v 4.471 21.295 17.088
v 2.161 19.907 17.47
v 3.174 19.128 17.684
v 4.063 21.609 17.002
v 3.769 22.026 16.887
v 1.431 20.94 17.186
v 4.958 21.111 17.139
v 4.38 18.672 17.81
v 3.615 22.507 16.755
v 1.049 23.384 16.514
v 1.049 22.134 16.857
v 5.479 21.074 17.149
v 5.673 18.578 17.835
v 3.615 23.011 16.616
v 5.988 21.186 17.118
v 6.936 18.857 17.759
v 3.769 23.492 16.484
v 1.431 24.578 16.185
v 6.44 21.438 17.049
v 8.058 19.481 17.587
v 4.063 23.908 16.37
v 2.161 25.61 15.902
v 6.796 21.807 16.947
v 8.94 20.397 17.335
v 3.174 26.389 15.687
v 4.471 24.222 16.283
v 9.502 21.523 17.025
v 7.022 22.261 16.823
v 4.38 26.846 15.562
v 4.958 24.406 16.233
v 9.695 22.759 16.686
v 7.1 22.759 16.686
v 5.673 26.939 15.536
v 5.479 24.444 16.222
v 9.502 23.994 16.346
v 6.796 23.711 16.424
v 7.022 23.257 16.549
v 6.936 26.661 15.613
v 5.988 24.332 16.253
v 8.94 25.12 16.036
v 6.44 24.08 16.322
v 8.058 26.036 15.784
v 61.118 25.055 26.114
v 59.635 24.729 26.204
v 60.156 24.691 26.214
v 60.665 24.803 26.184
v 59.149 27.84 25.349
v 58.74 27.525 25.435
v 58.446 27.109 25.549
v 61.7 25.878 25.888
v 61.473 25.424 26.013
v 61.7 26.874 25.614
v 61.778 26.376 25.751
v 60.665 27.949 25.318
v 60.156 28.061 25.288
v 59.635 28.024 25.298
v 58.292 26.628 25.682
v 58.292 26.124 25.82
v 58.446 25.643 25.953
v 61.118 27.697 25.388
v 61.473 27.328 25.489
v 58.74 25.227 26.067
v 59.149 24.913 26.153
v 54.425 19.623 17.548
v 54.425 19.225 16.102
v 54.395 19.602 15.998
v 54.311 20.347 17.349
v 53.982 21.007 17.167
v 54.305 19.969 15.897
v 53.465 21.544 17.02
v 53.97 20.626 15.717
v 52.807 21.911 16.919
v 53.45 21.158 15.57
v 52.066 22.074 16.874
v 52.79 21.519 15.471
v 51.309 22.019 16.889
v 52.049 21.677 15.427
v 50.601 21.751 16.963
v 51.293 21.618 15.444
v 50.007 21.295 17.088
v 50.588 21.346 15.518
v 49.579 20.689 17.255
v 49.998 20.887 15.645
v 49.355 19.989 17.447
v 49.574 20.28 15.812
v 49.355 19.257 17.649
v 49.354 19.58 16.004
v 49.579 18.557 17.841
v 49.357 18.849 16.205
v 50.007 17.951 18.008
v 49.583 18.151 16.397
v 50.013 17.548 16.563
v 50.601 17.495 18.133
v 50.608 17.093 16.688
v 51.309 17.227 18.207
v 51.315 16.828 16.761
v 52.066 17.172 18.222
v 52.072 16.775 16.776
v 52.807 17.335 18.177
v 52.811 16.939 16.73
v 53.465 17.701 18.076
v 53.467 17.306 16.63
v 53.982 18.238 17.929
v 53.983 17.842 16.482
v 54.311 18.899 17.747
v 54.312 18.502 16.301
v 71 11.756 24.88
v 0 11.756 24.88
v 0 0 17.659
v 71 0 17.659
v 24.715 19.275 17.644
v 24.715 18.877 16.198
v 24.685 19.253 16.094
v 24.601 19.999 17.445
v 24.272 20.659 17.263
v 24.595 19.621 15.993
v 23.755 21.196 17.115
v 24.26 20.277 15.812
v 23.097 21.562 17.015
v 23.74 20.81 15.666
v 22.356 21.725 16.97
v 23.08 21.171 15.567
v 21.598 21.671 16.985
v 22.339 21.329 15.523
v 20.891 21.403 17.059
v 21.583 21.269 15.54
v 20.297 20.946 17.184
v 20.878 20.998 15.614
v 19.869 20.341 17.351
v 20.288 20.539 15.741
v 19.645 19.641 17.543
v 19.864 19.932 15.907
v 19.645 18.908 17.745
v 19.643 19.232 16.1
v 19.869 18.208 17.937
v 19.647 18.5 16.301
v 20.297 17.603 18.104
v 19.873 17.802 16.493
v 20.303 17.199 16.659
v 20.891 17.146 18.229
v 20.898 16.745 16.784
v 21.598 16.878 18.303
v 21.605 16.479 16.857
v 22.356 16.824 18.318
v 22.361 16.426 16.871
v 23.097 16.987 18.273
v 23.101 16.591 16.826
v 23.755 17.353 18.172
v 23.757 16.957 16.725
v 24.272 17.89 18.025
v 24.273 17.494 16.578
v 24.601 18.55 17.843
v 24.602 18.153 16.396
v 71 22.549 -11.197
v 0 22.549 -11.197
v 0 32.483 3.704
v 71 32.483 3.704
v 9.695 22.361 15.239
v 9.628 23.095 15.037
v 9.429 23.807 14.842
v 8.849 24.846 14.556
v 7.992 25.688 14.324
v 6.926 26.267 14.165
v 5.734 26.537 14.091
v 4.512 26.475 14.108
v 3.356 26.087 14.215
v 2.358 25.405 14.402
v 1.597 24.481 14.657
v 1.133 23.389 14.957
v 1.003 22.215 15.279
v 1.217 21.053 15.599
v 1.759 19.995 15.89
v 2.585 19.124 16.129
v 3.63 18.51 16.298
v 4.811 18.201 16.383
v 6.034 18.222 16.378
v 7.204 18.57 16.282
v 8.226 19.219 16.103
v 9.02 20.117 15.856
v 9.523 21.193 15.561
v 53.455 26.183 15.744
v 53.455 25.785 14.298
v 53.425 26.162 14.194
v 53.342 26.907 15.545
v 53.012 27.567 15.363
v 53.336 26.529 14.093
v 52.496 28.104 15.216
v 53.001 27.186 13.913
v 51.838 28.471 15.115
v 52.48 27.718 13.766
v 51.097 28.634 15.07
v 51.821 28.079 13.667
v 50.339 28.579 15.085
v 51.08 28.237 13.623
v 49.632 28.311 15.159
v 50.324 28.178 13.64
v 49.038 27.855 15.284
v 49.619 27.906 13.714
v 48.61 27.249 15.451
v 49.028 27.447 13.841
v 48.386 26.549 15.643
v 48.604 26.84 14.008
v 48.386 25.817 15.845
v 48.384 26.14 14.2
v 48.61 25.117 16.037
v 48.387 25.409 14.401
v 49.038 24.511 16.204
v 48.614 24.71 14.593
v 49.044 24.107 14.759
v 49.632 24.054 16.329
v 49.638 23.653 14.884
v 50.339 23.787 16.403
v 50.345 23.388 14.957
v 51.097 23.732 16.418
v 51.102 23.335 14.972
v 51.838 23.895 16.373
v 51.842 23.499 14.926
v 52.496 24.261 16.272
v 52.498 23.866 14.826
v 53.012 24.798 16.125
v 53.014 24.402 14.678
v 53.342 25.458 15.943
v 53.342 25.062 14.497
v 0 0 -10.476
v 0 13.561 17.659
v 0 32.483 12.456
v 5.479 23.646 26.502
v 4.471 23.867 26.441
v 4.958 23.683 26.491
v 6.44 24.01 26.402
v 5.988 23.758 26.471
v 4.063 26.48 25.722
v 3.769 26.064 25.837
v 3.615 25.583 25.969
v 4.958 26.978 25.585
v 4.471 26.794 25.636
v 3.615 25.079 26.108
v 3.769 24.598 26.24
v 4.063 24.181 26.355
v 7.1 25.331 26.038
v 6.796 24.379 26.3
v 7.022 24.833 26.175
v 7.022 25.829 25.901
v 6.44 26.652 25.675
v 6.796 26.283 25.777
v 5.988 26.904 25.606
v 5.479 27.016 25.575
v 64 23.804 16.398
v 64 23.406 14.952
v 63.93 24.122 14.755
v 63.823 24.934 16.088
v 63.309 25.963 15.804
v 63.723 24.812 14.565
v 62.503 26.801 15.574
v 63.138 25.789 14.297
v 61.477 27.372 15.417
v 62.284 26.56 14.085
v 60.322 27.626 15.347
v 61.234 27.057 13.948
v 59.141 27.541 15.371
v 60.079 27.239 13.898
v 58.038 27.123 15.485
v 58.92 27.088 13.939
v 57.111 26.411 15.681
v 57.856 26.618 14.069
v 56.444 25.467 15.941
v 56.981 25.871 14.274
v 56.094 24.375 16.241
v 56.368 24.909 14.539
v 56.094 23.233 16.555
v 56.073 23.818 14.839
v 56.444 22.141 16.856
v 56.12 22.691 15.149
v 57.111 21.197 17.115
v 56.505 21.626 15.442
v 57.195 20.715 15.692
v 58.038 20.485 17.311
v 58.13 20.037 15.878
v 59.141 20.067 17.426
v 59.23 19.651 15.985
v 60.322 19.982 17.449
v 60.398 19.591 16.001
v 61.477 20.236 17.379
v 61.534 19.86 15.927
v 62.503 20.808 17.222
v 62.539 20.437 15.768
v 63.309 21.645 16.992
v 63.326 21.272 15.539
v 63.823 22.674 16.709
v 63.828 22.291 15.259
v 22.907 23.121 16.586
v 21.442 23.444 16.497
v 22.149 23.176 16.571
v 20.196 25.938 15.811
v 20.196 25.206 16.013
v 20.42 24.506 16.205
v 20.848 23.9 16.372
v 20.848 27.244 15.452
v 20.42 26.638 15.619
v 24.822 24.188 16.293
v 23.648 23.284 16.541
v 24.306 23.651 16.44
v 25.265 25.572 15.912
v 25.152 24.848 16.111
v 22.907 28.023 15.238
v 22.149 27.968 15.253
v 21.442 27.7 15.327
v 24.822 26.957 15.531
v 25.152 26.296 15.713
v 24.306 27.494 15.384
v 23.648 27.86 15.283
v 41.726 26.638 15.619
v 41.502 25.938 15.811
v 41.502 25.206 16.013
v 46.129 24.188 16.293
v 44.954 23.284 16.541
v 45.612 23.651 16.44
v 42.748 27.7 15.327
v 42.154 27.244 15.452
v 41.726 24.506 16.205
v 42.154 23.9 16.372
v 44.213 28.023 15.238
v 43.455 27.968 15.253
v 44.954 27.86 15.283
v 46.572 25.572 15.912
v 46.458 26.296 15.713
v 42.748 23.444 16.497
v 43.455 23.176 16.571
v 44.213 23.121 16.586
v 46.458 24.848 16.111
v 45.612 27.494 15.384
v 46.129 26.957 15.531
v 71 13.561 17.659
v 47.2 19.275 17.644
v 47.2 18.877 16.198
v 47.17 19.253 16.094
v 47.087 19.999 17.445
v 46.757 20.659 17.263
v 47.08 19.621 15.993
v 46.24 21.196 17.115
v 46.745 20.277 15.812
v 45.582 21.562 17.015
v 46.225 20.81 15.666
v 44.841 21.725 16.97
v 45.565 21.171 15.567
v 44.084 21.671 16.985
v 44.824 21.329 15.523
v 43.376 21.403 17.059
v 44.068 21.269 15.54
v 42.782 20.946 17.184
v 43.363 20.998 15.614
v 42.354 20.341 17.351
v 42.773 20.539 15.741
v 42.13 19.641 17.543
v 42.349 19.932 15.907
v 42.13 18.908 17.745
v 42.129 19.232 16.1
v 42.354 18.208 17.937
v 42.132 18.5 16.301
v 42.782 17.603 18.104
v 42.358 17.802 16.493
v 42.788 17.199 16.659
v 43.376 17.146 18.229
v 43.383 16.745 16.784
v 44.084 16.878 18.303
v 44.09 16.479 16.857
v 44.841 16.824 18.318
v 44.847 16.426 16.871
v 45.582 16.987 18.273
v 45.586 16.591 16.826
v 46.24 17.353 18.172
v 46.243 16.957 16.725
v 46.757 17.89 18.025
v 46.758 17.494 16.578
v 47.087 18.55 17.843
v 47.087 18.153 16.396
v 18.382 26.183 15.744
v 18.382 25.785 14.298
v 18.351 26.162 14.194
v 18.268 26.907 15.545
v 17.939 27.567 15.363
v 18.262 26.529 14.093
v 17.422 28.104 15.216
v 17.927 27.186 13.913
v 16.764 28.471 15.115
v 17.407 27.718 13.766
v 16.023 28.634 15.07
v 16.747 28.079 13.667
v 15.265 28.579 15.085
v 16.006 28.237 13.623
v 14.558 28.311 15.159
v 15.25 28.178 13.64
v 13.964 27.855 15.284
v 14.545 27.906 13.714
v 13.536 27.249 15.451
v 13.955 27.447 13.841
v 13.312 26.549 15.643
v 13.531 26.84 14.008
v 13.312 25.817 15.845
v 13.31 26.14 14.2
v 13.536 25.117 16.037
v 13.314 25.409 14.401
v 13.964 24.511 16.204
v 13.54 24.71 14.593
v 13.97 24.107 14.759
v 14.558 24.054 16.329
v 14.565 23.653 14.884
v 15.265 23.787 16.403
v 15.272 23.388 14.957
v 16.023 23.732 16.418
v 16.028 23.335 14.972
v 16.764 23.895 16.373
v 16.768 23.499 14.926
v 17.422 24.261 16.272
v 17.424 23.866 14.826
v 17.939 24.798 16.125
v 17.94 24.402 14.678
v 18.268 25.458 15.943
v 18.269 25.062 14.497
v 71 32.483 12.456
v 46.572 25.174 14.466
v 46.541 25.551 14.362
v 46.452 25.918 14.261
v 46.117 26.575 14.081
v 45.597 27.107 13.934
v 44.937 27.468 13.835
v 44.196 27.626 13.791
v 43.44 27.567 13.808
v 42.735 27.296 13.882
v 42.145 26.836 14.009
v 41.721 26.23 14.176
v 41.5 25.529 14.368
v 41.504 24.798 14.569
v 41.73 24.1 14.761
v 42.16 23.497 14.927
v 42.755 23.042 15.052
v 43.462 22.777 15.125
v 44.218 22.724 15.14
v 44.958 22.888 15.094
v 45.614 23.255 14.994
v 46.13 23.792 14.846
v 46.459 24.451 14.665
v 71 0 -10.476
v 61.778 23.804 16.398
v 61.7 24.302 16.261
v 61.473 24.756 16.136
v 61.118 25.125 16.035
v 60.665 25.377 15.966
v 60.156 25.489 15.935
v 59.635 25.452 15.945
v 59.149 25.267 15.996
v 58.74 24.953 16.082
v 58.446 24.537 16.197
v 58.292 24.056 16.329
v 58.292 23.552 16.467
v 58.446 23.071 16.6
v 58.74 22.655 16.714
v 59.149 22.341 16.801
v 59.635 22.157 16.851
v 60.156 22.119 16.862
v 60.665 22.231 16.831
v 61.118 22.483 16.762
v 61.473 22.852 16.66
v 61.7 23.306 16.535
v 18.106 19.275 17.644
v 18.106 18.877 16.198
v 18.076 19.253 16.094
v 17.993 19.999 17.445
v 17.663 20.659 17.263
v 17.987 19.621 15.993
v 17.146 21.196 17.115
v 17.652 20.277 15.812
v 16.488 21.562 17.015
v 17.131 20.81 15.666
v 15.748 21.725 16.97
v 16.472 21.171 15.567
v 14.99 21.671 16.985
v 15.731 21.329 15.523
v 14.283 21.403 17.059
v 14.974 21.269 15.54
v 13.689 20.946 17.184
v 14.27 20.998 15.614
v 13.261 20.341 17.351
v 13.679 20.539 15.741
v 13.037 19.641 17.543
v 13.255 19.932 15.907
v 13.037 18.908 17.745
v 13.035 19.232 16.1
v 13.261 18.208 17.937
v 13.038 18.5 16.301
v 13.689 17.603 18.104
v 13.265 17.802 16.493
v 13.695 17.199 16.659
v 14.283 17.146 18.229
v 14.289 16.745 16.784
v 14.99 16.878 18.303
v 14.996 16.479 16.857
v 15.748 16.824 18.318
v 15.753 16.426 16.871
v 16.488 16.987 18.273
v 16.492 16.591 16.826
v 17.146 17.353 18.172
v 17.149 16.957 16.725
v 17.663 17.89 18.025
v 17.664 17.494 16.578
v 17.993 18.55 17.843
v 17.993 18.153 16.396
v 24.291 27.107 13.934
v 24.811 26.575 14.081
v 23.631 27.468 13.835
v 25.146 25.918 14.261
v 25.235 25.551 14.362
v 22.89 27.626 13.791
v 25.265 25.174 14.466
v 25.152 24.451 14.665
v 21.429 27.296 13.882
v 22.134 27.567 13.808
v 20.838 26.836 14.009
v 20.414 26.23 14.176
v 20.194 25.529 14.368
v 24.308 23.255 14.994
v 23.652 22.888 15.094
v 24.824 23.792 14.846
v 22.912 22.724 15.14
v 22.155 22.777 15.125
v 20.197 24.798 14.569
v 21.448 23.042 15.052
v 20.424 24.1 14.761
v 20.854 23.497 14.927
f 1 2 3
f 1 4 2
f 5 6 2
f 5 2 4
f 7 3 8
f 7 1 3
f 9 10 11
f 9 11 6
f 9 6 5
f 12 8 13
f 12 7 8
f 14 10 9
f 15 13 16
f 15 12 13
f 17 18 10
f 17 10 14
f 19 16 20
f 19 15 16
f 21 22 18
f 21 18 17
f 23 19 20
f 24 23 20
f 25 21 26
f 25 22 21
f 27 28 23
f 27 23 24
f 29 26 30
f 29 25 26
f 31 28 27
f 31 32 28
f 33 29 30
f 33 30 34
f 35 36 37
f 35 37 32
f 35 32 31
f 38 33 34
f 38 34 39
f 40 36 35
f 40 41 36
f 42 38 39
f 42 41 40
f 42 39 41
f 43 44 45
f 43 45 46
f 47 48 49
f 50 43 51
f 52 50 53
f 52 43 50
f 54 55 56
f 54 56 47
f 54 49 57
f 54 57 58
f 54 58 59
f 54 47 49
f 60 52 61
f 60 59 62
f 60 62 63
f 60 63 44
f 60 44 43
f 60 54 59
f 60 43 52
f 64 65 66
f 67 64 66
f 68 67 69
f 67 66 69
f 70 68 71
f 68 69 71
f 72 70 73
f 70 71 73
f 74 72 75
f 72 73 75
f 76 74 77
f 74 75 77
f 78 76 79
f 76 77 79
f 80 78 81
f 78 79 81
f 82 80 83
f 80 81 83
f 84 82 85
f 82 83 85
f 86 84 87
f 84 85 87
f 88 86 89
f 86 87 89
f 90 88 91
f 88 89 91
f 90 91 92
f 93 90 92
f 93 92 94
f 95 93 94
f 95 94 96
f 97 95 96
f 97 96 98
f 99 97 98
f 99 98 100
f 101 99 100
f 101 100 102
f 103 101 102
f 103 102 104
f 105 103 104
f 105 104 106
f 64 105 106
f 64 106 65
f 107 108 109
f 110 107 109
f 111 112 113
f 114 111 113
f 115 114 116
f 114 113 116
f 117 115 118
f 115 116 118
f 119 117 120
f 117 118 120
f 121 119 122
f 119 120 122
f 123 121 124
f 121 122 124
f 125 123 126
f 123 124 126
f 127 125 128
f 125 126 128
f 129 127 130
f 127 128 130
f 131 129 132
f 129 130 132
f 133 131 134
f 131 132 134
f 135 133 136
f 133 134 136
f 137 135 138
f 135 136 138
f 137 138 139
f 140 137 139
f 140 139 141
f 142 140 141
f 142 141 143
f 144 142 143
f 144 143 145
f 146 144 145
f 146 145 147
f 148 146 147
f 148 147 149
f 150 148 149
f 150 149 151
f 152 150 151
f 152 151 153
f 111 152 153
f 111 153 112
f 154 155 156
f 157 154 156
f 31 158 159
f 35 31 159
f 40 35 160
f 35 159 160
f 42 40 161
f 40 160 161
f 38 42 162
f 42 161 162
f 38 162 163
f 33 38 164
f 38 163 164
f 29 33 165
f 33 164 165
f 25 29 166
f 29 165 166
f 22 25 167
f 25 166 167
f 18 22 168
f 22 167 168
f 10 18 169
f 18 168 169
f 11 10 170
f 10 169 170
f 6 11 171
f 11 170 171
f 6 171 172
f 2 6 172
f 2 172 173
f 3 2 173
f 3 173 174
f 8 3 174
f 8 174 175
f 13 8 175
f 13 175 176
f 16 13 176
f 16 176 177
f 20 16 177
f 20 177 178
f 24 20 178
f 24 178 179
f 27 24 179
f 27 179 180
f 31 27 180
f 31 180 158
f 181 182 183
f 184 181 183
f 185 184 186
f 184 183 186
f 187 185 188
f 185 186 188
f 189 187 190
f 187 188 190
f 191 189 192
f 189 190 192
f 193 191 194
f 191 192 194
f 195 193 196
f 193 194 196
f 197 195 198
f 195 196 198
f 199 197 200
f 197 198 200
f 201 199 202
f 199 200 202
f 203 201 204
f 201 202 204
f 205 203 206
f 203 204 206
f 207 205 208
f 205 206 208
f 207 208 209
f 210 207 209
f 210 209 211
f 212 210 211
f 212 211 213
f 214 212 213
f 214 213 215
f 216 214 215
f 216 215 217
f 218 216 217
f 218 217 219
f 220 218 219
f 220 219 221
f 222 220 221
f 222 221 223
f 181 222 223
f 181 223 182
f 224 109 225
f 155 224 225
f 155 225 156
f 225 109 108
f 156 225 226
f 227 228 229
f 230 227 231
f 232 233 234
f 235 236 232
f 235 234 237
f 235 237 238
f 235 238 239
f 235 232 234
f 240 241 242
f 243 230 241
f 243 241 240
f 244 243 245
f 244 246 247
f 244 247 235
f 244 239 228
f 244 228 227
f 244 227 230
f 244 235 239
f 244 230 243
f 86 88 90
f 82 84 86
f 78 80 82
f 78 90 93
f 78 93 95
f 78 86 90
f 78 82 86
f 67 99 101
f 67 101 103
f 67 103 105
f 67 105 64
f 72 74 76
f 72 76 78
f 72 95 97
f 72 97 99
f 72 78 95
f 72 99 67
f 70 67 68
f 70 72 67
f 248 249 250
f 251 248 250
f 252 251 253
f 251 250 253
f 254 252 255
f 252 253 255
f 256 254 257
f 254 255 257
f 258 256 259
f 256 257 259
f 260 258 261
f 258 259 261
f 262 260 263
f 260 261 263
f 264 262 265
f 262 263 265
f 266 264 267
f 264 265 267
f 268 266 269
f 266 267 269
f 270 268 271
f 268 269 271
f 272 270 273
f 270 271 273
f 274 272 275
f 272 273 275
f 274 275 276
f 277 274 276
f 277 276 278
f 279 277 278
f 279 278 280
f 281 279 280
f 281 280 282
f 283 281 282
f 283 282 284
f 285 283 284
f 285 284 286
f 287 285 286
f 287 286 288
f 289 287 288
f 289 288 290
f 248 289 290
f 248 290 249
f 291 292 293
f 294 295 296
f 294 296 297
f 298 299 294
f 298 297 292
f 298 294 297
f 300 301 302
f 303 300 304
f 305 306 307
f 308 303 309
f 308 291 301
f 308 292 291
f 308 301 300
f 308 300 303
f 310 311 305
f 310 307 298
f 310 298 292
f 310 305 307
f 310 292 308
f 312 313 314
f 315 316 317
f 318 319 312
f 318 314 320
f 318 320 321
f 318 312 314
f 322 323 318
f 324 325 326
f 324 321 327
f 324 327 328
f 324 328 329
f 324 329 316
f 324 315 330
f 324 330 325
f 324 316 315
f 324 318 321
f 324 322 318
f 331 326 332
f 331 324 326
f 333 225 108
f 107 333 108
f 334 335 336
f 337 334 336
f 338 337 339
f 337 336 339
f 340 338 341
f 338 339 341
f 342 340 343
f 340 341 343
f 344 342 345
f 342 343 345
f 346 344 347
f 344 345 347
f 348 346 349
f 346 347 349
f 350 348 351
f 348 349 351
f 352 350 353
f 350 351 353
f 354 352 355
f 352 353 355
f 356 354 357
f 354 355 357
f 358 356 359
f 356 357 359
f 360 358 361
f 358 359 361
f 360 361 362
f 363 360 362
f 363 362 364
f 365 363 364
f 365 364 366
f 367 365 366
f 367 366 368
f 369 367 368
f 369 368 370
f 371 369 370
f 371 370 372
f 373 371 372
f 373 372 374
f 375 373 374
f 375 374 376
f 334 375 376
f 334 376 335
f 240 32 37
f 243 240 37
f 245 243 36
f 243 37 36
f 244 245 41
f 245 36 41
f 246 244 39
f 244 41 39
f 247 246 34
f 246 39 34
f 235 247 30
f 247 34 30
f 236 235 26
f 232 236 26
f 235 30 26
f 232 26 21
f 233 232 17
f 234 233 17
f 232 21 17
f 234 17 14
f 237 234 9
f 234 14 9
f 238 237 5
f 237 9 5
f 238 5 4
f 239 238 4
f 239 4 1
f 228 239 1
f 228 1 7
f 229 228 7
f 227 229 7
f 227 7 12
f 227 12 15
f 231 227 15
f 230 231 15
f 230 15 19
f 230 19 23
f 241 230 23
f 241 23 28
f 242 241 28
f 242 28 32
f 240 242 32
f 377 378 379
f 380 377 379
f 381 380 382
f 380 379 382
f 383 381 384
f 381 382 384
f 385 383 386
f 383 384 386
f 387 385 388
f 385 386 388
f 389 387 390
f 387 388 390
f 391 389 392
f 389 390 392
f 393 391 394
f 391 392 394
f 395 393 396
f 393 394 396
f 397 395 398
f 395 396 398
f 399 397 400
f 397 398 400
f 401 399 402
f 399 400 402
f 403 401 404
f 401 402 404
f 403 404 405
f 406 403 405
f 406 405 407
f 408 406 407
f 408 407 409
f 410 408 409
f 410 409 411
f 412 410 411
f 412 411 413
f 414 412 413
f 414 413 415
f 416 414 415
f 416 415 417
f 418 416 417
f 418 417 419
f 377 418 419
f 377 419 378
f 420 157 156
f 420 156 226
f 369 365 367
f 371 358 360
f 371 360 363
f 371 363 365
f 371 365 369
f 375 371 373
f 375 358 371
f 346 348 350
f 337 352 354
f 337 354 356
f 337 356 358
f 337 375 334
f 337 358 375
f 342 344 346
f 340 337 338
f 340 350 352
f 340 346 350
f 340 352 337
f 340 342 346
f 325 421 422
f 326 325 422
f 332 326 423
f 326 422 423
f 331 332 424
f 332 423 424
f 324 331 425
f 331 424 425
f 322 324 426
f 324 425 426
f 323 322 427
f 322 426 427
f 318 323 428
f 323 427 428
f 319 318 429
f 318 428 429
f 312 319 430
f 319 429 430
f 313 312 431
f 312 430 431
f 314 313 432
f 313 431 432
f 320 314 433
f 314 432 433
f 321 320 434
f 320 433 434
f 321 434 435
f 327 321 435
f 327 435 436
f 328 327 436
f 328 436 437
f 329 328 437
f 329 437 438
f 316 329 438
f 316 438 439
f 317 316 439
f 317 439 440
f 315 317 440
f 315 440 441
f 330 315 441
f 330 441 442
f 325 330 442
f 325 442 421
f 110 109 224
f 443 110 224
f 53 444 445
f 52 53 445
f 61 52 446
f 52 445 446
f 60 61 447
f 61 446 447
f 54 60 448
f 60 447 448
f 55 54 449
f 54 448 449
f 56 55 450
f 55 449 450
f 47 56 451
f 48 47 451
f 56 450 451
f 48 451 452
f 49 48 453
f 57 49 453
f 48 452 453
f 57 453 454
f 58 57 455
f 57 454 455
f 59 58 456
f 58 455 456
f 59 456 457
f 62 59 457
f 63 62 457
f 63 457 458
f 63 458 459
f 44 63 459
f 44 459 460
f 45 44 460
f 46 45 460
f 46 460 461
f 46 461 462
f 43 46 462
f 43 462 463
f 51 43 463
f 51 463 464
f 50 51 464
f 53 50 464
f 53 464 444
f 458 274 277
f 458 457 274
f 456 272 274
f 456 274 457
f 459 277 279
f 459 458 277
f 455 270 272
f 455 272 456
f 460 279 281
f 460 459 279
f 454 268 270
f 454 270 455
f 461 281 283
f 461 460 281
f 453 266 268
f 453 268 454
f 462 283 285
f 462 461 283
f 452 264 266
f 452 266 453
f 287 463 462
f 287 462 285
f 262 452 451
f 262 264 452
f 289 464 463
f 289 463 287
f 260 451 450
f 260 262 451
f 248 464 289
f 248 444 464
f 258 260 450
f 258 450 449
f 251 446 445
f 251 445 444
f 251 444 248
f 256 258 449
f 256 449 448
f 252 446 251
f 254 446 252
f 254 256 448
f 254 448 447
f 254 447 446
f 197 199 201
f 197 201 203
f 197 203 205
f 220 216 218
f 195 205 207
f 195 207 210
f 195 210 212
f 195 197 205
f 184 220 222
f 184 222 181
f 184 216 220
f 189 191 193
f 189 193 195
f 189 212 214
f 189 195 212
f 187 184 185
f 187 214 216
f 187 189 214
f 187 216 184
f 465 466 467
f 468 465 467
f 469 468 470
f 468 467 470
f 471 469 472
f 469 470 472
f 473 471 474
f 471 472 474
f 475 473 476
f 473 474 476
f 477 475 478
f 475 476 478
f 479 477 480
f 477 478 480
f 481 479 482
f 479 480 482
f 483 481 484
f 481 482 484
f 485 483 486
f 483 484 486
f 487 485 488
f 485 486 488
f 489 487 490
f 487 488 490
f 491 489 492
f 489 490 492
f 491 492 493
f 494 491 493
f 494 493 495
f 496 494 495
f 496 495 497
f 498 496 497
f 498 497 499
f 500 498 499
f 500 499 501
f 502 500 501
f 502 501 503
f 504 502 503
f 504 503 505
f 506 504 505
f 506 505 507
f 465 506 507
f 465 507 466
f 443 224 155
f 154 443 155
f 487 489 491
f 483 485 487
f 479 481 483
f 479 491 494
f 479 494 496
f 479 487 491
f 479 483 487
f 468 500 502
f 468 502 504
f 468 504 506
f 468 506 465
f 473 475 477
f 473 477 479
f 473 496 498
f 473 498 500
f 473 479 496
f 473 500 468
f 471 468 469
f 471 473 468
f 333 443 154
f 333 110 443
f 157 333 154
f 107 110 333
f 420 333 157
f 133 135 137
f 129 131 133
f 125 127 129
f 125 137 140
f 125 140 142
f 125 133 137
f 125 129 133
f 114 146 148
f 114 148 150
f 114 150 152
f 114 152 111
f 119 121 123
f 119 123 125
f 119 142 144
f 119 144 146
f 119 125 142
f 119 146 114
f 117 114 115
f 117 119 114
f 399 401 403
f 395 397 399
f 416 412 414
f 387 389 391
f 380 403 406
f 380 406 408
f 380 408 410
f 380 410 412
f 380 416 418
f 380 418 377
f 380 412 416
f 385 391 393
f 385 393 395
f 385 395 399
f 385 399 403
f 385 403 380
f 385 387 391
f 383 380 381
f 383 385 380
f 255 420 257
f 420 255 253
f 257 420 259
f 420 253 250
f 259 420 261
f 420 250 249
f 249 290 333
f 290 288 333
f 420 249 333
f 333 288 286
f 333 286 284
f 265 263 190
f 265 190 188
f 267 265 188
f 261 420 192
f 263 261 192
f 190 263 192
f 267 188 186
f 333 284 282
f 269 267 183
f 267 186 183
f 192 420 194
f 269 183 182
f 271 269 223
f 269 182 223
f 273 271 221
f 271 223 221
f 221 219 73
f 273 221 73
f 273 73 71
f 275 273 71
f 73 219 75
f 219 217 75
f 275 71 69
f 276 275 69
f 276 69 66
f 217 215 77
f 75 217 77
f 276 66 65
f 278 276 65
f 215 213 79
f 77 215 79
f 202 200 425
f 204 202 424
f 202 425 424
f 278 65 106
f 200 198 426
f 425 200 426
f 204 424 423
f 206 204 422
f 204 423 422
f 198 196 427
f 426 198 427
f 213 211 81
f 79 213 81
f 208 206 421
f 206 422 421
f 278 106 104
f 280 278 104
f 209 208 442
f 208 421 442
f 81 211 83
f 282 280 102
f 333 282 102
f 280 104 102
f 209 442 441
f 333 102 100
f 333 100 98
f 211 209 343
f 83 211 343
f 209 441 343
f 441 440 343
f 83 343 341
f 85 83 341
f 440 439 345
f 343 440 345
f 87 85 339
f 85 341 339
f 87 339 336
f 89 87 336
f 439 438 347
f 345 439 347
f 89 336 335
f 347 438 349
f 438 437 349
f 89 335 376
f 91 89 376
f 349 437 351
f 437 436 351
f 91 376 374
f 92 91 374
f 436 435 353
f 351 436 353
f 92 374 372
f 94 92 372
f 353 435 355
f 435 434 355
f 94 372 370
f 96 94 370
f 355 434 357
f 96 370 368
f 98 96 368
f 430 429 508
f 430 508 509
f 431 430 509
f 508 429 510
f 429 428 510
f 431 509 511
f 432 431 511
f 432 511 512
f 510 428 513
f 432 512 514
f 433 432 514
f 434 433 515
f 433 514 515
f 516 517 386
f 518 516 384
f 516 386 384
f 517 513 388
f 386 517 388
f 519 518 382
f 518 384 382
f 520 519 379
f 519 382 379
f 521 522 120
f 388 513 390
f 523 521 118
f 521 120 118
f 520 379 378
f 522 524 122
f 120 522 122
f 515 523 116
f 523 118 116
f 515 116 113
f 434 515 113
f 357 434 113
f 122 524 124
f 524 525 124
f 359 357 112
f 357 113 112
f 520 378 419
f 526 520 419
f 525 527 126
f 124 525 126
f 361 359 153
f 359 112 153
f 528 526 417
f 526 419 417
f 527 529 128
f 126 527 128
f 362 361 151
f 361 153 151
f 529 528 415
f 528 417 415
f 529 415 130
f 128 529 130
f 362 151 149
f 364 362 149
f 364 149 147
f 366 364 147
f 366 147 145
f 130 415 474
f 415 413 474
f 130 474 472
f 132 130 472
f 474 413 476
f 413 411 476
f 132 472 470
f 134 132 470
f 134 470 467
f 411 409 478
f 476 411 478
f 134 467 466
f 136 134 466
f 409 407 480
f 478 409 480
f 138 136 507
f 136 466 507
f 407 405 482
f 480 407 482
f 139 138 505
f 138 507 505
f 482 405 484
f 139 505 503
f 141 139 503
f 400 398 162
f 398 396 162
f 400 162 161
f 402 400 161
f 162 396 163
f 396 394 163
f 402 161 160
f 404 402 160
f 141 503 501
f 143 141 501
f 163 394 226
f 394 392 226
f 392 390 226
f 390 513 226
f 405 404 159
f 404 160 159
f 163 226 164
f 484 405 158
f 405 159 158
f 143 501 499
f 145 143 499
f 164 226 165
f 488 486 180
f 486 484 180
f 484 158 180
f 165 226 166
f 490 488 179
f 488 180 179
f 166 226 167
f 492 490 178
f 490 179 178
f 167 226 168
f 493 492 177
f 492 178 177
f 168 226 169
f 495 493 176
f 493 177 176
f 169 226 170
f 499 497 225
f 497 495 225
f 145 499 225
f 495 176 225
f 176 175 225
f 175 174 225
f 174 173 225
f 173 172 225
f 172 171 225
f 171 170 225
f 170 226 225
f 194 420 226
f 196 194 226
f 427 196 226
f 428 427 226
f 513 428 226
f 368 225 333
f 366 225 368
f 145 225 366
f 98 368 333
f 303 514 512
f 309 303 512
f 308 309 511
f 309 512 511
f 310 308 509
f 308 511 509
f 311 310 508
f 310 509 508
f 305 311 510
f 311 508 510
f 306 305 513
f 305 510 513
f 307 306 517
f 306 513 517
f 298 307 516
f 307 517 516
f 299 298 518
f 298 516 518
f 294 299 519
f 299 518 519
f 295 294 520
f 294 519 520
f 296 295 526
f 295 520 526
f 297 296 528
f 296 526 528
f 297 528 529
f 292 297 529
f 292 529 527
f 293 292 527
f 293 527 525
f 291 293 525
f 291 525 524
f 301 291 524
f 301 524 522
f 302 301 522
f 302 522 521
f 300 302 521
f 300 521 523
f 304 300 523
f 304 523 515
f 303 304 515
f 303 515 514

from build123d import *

# Parameters (mm, degrees)
F1_DEPTH = 65
F2_R     = 2
F3_R     = 2.548945
F3_R_2   = 2.548946
F3_R_3   = 2.548929
F3_R_4   = 4.347674
F3_R_5   = 3.974959
F4_DEPTH = 1.5
F5_R     = 1.75256
F5_R_2   = 1.752559
F6_DEPTH = 11.2
F7_DEPTH = 71


with BuildPart() as f1:
    # F0 (on Right) → F1 (new body)
    with BuildSketch(Plane.YZ):
        Polygon((0, -10.475962), (22.549306, -11.196655), (32.483309, 3.704351), (32.483309, 12.455739), (13.561399, 17.659265), (11.756126, 24.880352), (0, 17.659265), align=None)
    extrude(amount=F1_DEPTH)

    # F2
    f2_edges = [f1.edges().sort_by_distance(p)[0] for p in [
        (32.5, 32.483309, 3.704351),
        (32.5, 32.483309, 12.455739),
    ]]
    fillet(f2_edges, radius=F2_R)

    # F3 (on face) → F4 (join)
    with BuildSketch(Plane(origin=(0, 5.468337, 19.884858), x_dir=(1, 0, 0), z_dir=(0, 0.265157, 0.964205))):
        with Locations((50.906317, 21.071024)):
            Circle(F3_R)
        with Locations((44.022555, 20.437524)):
            Circle(F3_R)
        with Locations((44.650806, 13.906249)):
            Circle(F3_R_2)
        with Locations((51.875702, 14.267603)):
            Circle(F3_R)
        with Locations((22.165647, 13.906249)):
            Circle(F3_R)
        with Locations((15.557256, 13.906249)):
            Circle(F3_R)
        with Locations((15.832605, 21.071026)):
            Circle(F3_R)
        with Locations((22.716347, 20.437526)):
            Circle(F3_R_3)
        with Locations((5.347674, 17.519839)):
            Circle(F3_R_4)
        with Locations((60.025041, 18.603914)):
            Circle(F3_R_5)
    extrude(amount=F4_DEPTH)

    # F5 (on face) → F6 (join)
    with BuildSketch(Plane(origin=(0, 5.468337, 19.884858), x_dir=(1, 0, 0), z_dir=(0, 0.265157, 0.964205))):
        with Locations((60.025041, 18.603914)):
            Circle(F5_R)
        with Locations((5.347674, 17.519839)):
            Circle(F5_R_2)
    extrude(amount=F6_DEPTH)

    # F0 (on Right) → F7 (join)
    with BuildSketch(Plane.YZ):
        Polygon((0, -10.475962), (22.549306, -11.196655), (32.483309, 3.704351), (32.483309, 12.455739), (13.561399, 17.659265), (11.756126, 24.880352), (0, 17.659265), align=None)
    extrude(amount=F7_DEPTH)


solid = f1.part
